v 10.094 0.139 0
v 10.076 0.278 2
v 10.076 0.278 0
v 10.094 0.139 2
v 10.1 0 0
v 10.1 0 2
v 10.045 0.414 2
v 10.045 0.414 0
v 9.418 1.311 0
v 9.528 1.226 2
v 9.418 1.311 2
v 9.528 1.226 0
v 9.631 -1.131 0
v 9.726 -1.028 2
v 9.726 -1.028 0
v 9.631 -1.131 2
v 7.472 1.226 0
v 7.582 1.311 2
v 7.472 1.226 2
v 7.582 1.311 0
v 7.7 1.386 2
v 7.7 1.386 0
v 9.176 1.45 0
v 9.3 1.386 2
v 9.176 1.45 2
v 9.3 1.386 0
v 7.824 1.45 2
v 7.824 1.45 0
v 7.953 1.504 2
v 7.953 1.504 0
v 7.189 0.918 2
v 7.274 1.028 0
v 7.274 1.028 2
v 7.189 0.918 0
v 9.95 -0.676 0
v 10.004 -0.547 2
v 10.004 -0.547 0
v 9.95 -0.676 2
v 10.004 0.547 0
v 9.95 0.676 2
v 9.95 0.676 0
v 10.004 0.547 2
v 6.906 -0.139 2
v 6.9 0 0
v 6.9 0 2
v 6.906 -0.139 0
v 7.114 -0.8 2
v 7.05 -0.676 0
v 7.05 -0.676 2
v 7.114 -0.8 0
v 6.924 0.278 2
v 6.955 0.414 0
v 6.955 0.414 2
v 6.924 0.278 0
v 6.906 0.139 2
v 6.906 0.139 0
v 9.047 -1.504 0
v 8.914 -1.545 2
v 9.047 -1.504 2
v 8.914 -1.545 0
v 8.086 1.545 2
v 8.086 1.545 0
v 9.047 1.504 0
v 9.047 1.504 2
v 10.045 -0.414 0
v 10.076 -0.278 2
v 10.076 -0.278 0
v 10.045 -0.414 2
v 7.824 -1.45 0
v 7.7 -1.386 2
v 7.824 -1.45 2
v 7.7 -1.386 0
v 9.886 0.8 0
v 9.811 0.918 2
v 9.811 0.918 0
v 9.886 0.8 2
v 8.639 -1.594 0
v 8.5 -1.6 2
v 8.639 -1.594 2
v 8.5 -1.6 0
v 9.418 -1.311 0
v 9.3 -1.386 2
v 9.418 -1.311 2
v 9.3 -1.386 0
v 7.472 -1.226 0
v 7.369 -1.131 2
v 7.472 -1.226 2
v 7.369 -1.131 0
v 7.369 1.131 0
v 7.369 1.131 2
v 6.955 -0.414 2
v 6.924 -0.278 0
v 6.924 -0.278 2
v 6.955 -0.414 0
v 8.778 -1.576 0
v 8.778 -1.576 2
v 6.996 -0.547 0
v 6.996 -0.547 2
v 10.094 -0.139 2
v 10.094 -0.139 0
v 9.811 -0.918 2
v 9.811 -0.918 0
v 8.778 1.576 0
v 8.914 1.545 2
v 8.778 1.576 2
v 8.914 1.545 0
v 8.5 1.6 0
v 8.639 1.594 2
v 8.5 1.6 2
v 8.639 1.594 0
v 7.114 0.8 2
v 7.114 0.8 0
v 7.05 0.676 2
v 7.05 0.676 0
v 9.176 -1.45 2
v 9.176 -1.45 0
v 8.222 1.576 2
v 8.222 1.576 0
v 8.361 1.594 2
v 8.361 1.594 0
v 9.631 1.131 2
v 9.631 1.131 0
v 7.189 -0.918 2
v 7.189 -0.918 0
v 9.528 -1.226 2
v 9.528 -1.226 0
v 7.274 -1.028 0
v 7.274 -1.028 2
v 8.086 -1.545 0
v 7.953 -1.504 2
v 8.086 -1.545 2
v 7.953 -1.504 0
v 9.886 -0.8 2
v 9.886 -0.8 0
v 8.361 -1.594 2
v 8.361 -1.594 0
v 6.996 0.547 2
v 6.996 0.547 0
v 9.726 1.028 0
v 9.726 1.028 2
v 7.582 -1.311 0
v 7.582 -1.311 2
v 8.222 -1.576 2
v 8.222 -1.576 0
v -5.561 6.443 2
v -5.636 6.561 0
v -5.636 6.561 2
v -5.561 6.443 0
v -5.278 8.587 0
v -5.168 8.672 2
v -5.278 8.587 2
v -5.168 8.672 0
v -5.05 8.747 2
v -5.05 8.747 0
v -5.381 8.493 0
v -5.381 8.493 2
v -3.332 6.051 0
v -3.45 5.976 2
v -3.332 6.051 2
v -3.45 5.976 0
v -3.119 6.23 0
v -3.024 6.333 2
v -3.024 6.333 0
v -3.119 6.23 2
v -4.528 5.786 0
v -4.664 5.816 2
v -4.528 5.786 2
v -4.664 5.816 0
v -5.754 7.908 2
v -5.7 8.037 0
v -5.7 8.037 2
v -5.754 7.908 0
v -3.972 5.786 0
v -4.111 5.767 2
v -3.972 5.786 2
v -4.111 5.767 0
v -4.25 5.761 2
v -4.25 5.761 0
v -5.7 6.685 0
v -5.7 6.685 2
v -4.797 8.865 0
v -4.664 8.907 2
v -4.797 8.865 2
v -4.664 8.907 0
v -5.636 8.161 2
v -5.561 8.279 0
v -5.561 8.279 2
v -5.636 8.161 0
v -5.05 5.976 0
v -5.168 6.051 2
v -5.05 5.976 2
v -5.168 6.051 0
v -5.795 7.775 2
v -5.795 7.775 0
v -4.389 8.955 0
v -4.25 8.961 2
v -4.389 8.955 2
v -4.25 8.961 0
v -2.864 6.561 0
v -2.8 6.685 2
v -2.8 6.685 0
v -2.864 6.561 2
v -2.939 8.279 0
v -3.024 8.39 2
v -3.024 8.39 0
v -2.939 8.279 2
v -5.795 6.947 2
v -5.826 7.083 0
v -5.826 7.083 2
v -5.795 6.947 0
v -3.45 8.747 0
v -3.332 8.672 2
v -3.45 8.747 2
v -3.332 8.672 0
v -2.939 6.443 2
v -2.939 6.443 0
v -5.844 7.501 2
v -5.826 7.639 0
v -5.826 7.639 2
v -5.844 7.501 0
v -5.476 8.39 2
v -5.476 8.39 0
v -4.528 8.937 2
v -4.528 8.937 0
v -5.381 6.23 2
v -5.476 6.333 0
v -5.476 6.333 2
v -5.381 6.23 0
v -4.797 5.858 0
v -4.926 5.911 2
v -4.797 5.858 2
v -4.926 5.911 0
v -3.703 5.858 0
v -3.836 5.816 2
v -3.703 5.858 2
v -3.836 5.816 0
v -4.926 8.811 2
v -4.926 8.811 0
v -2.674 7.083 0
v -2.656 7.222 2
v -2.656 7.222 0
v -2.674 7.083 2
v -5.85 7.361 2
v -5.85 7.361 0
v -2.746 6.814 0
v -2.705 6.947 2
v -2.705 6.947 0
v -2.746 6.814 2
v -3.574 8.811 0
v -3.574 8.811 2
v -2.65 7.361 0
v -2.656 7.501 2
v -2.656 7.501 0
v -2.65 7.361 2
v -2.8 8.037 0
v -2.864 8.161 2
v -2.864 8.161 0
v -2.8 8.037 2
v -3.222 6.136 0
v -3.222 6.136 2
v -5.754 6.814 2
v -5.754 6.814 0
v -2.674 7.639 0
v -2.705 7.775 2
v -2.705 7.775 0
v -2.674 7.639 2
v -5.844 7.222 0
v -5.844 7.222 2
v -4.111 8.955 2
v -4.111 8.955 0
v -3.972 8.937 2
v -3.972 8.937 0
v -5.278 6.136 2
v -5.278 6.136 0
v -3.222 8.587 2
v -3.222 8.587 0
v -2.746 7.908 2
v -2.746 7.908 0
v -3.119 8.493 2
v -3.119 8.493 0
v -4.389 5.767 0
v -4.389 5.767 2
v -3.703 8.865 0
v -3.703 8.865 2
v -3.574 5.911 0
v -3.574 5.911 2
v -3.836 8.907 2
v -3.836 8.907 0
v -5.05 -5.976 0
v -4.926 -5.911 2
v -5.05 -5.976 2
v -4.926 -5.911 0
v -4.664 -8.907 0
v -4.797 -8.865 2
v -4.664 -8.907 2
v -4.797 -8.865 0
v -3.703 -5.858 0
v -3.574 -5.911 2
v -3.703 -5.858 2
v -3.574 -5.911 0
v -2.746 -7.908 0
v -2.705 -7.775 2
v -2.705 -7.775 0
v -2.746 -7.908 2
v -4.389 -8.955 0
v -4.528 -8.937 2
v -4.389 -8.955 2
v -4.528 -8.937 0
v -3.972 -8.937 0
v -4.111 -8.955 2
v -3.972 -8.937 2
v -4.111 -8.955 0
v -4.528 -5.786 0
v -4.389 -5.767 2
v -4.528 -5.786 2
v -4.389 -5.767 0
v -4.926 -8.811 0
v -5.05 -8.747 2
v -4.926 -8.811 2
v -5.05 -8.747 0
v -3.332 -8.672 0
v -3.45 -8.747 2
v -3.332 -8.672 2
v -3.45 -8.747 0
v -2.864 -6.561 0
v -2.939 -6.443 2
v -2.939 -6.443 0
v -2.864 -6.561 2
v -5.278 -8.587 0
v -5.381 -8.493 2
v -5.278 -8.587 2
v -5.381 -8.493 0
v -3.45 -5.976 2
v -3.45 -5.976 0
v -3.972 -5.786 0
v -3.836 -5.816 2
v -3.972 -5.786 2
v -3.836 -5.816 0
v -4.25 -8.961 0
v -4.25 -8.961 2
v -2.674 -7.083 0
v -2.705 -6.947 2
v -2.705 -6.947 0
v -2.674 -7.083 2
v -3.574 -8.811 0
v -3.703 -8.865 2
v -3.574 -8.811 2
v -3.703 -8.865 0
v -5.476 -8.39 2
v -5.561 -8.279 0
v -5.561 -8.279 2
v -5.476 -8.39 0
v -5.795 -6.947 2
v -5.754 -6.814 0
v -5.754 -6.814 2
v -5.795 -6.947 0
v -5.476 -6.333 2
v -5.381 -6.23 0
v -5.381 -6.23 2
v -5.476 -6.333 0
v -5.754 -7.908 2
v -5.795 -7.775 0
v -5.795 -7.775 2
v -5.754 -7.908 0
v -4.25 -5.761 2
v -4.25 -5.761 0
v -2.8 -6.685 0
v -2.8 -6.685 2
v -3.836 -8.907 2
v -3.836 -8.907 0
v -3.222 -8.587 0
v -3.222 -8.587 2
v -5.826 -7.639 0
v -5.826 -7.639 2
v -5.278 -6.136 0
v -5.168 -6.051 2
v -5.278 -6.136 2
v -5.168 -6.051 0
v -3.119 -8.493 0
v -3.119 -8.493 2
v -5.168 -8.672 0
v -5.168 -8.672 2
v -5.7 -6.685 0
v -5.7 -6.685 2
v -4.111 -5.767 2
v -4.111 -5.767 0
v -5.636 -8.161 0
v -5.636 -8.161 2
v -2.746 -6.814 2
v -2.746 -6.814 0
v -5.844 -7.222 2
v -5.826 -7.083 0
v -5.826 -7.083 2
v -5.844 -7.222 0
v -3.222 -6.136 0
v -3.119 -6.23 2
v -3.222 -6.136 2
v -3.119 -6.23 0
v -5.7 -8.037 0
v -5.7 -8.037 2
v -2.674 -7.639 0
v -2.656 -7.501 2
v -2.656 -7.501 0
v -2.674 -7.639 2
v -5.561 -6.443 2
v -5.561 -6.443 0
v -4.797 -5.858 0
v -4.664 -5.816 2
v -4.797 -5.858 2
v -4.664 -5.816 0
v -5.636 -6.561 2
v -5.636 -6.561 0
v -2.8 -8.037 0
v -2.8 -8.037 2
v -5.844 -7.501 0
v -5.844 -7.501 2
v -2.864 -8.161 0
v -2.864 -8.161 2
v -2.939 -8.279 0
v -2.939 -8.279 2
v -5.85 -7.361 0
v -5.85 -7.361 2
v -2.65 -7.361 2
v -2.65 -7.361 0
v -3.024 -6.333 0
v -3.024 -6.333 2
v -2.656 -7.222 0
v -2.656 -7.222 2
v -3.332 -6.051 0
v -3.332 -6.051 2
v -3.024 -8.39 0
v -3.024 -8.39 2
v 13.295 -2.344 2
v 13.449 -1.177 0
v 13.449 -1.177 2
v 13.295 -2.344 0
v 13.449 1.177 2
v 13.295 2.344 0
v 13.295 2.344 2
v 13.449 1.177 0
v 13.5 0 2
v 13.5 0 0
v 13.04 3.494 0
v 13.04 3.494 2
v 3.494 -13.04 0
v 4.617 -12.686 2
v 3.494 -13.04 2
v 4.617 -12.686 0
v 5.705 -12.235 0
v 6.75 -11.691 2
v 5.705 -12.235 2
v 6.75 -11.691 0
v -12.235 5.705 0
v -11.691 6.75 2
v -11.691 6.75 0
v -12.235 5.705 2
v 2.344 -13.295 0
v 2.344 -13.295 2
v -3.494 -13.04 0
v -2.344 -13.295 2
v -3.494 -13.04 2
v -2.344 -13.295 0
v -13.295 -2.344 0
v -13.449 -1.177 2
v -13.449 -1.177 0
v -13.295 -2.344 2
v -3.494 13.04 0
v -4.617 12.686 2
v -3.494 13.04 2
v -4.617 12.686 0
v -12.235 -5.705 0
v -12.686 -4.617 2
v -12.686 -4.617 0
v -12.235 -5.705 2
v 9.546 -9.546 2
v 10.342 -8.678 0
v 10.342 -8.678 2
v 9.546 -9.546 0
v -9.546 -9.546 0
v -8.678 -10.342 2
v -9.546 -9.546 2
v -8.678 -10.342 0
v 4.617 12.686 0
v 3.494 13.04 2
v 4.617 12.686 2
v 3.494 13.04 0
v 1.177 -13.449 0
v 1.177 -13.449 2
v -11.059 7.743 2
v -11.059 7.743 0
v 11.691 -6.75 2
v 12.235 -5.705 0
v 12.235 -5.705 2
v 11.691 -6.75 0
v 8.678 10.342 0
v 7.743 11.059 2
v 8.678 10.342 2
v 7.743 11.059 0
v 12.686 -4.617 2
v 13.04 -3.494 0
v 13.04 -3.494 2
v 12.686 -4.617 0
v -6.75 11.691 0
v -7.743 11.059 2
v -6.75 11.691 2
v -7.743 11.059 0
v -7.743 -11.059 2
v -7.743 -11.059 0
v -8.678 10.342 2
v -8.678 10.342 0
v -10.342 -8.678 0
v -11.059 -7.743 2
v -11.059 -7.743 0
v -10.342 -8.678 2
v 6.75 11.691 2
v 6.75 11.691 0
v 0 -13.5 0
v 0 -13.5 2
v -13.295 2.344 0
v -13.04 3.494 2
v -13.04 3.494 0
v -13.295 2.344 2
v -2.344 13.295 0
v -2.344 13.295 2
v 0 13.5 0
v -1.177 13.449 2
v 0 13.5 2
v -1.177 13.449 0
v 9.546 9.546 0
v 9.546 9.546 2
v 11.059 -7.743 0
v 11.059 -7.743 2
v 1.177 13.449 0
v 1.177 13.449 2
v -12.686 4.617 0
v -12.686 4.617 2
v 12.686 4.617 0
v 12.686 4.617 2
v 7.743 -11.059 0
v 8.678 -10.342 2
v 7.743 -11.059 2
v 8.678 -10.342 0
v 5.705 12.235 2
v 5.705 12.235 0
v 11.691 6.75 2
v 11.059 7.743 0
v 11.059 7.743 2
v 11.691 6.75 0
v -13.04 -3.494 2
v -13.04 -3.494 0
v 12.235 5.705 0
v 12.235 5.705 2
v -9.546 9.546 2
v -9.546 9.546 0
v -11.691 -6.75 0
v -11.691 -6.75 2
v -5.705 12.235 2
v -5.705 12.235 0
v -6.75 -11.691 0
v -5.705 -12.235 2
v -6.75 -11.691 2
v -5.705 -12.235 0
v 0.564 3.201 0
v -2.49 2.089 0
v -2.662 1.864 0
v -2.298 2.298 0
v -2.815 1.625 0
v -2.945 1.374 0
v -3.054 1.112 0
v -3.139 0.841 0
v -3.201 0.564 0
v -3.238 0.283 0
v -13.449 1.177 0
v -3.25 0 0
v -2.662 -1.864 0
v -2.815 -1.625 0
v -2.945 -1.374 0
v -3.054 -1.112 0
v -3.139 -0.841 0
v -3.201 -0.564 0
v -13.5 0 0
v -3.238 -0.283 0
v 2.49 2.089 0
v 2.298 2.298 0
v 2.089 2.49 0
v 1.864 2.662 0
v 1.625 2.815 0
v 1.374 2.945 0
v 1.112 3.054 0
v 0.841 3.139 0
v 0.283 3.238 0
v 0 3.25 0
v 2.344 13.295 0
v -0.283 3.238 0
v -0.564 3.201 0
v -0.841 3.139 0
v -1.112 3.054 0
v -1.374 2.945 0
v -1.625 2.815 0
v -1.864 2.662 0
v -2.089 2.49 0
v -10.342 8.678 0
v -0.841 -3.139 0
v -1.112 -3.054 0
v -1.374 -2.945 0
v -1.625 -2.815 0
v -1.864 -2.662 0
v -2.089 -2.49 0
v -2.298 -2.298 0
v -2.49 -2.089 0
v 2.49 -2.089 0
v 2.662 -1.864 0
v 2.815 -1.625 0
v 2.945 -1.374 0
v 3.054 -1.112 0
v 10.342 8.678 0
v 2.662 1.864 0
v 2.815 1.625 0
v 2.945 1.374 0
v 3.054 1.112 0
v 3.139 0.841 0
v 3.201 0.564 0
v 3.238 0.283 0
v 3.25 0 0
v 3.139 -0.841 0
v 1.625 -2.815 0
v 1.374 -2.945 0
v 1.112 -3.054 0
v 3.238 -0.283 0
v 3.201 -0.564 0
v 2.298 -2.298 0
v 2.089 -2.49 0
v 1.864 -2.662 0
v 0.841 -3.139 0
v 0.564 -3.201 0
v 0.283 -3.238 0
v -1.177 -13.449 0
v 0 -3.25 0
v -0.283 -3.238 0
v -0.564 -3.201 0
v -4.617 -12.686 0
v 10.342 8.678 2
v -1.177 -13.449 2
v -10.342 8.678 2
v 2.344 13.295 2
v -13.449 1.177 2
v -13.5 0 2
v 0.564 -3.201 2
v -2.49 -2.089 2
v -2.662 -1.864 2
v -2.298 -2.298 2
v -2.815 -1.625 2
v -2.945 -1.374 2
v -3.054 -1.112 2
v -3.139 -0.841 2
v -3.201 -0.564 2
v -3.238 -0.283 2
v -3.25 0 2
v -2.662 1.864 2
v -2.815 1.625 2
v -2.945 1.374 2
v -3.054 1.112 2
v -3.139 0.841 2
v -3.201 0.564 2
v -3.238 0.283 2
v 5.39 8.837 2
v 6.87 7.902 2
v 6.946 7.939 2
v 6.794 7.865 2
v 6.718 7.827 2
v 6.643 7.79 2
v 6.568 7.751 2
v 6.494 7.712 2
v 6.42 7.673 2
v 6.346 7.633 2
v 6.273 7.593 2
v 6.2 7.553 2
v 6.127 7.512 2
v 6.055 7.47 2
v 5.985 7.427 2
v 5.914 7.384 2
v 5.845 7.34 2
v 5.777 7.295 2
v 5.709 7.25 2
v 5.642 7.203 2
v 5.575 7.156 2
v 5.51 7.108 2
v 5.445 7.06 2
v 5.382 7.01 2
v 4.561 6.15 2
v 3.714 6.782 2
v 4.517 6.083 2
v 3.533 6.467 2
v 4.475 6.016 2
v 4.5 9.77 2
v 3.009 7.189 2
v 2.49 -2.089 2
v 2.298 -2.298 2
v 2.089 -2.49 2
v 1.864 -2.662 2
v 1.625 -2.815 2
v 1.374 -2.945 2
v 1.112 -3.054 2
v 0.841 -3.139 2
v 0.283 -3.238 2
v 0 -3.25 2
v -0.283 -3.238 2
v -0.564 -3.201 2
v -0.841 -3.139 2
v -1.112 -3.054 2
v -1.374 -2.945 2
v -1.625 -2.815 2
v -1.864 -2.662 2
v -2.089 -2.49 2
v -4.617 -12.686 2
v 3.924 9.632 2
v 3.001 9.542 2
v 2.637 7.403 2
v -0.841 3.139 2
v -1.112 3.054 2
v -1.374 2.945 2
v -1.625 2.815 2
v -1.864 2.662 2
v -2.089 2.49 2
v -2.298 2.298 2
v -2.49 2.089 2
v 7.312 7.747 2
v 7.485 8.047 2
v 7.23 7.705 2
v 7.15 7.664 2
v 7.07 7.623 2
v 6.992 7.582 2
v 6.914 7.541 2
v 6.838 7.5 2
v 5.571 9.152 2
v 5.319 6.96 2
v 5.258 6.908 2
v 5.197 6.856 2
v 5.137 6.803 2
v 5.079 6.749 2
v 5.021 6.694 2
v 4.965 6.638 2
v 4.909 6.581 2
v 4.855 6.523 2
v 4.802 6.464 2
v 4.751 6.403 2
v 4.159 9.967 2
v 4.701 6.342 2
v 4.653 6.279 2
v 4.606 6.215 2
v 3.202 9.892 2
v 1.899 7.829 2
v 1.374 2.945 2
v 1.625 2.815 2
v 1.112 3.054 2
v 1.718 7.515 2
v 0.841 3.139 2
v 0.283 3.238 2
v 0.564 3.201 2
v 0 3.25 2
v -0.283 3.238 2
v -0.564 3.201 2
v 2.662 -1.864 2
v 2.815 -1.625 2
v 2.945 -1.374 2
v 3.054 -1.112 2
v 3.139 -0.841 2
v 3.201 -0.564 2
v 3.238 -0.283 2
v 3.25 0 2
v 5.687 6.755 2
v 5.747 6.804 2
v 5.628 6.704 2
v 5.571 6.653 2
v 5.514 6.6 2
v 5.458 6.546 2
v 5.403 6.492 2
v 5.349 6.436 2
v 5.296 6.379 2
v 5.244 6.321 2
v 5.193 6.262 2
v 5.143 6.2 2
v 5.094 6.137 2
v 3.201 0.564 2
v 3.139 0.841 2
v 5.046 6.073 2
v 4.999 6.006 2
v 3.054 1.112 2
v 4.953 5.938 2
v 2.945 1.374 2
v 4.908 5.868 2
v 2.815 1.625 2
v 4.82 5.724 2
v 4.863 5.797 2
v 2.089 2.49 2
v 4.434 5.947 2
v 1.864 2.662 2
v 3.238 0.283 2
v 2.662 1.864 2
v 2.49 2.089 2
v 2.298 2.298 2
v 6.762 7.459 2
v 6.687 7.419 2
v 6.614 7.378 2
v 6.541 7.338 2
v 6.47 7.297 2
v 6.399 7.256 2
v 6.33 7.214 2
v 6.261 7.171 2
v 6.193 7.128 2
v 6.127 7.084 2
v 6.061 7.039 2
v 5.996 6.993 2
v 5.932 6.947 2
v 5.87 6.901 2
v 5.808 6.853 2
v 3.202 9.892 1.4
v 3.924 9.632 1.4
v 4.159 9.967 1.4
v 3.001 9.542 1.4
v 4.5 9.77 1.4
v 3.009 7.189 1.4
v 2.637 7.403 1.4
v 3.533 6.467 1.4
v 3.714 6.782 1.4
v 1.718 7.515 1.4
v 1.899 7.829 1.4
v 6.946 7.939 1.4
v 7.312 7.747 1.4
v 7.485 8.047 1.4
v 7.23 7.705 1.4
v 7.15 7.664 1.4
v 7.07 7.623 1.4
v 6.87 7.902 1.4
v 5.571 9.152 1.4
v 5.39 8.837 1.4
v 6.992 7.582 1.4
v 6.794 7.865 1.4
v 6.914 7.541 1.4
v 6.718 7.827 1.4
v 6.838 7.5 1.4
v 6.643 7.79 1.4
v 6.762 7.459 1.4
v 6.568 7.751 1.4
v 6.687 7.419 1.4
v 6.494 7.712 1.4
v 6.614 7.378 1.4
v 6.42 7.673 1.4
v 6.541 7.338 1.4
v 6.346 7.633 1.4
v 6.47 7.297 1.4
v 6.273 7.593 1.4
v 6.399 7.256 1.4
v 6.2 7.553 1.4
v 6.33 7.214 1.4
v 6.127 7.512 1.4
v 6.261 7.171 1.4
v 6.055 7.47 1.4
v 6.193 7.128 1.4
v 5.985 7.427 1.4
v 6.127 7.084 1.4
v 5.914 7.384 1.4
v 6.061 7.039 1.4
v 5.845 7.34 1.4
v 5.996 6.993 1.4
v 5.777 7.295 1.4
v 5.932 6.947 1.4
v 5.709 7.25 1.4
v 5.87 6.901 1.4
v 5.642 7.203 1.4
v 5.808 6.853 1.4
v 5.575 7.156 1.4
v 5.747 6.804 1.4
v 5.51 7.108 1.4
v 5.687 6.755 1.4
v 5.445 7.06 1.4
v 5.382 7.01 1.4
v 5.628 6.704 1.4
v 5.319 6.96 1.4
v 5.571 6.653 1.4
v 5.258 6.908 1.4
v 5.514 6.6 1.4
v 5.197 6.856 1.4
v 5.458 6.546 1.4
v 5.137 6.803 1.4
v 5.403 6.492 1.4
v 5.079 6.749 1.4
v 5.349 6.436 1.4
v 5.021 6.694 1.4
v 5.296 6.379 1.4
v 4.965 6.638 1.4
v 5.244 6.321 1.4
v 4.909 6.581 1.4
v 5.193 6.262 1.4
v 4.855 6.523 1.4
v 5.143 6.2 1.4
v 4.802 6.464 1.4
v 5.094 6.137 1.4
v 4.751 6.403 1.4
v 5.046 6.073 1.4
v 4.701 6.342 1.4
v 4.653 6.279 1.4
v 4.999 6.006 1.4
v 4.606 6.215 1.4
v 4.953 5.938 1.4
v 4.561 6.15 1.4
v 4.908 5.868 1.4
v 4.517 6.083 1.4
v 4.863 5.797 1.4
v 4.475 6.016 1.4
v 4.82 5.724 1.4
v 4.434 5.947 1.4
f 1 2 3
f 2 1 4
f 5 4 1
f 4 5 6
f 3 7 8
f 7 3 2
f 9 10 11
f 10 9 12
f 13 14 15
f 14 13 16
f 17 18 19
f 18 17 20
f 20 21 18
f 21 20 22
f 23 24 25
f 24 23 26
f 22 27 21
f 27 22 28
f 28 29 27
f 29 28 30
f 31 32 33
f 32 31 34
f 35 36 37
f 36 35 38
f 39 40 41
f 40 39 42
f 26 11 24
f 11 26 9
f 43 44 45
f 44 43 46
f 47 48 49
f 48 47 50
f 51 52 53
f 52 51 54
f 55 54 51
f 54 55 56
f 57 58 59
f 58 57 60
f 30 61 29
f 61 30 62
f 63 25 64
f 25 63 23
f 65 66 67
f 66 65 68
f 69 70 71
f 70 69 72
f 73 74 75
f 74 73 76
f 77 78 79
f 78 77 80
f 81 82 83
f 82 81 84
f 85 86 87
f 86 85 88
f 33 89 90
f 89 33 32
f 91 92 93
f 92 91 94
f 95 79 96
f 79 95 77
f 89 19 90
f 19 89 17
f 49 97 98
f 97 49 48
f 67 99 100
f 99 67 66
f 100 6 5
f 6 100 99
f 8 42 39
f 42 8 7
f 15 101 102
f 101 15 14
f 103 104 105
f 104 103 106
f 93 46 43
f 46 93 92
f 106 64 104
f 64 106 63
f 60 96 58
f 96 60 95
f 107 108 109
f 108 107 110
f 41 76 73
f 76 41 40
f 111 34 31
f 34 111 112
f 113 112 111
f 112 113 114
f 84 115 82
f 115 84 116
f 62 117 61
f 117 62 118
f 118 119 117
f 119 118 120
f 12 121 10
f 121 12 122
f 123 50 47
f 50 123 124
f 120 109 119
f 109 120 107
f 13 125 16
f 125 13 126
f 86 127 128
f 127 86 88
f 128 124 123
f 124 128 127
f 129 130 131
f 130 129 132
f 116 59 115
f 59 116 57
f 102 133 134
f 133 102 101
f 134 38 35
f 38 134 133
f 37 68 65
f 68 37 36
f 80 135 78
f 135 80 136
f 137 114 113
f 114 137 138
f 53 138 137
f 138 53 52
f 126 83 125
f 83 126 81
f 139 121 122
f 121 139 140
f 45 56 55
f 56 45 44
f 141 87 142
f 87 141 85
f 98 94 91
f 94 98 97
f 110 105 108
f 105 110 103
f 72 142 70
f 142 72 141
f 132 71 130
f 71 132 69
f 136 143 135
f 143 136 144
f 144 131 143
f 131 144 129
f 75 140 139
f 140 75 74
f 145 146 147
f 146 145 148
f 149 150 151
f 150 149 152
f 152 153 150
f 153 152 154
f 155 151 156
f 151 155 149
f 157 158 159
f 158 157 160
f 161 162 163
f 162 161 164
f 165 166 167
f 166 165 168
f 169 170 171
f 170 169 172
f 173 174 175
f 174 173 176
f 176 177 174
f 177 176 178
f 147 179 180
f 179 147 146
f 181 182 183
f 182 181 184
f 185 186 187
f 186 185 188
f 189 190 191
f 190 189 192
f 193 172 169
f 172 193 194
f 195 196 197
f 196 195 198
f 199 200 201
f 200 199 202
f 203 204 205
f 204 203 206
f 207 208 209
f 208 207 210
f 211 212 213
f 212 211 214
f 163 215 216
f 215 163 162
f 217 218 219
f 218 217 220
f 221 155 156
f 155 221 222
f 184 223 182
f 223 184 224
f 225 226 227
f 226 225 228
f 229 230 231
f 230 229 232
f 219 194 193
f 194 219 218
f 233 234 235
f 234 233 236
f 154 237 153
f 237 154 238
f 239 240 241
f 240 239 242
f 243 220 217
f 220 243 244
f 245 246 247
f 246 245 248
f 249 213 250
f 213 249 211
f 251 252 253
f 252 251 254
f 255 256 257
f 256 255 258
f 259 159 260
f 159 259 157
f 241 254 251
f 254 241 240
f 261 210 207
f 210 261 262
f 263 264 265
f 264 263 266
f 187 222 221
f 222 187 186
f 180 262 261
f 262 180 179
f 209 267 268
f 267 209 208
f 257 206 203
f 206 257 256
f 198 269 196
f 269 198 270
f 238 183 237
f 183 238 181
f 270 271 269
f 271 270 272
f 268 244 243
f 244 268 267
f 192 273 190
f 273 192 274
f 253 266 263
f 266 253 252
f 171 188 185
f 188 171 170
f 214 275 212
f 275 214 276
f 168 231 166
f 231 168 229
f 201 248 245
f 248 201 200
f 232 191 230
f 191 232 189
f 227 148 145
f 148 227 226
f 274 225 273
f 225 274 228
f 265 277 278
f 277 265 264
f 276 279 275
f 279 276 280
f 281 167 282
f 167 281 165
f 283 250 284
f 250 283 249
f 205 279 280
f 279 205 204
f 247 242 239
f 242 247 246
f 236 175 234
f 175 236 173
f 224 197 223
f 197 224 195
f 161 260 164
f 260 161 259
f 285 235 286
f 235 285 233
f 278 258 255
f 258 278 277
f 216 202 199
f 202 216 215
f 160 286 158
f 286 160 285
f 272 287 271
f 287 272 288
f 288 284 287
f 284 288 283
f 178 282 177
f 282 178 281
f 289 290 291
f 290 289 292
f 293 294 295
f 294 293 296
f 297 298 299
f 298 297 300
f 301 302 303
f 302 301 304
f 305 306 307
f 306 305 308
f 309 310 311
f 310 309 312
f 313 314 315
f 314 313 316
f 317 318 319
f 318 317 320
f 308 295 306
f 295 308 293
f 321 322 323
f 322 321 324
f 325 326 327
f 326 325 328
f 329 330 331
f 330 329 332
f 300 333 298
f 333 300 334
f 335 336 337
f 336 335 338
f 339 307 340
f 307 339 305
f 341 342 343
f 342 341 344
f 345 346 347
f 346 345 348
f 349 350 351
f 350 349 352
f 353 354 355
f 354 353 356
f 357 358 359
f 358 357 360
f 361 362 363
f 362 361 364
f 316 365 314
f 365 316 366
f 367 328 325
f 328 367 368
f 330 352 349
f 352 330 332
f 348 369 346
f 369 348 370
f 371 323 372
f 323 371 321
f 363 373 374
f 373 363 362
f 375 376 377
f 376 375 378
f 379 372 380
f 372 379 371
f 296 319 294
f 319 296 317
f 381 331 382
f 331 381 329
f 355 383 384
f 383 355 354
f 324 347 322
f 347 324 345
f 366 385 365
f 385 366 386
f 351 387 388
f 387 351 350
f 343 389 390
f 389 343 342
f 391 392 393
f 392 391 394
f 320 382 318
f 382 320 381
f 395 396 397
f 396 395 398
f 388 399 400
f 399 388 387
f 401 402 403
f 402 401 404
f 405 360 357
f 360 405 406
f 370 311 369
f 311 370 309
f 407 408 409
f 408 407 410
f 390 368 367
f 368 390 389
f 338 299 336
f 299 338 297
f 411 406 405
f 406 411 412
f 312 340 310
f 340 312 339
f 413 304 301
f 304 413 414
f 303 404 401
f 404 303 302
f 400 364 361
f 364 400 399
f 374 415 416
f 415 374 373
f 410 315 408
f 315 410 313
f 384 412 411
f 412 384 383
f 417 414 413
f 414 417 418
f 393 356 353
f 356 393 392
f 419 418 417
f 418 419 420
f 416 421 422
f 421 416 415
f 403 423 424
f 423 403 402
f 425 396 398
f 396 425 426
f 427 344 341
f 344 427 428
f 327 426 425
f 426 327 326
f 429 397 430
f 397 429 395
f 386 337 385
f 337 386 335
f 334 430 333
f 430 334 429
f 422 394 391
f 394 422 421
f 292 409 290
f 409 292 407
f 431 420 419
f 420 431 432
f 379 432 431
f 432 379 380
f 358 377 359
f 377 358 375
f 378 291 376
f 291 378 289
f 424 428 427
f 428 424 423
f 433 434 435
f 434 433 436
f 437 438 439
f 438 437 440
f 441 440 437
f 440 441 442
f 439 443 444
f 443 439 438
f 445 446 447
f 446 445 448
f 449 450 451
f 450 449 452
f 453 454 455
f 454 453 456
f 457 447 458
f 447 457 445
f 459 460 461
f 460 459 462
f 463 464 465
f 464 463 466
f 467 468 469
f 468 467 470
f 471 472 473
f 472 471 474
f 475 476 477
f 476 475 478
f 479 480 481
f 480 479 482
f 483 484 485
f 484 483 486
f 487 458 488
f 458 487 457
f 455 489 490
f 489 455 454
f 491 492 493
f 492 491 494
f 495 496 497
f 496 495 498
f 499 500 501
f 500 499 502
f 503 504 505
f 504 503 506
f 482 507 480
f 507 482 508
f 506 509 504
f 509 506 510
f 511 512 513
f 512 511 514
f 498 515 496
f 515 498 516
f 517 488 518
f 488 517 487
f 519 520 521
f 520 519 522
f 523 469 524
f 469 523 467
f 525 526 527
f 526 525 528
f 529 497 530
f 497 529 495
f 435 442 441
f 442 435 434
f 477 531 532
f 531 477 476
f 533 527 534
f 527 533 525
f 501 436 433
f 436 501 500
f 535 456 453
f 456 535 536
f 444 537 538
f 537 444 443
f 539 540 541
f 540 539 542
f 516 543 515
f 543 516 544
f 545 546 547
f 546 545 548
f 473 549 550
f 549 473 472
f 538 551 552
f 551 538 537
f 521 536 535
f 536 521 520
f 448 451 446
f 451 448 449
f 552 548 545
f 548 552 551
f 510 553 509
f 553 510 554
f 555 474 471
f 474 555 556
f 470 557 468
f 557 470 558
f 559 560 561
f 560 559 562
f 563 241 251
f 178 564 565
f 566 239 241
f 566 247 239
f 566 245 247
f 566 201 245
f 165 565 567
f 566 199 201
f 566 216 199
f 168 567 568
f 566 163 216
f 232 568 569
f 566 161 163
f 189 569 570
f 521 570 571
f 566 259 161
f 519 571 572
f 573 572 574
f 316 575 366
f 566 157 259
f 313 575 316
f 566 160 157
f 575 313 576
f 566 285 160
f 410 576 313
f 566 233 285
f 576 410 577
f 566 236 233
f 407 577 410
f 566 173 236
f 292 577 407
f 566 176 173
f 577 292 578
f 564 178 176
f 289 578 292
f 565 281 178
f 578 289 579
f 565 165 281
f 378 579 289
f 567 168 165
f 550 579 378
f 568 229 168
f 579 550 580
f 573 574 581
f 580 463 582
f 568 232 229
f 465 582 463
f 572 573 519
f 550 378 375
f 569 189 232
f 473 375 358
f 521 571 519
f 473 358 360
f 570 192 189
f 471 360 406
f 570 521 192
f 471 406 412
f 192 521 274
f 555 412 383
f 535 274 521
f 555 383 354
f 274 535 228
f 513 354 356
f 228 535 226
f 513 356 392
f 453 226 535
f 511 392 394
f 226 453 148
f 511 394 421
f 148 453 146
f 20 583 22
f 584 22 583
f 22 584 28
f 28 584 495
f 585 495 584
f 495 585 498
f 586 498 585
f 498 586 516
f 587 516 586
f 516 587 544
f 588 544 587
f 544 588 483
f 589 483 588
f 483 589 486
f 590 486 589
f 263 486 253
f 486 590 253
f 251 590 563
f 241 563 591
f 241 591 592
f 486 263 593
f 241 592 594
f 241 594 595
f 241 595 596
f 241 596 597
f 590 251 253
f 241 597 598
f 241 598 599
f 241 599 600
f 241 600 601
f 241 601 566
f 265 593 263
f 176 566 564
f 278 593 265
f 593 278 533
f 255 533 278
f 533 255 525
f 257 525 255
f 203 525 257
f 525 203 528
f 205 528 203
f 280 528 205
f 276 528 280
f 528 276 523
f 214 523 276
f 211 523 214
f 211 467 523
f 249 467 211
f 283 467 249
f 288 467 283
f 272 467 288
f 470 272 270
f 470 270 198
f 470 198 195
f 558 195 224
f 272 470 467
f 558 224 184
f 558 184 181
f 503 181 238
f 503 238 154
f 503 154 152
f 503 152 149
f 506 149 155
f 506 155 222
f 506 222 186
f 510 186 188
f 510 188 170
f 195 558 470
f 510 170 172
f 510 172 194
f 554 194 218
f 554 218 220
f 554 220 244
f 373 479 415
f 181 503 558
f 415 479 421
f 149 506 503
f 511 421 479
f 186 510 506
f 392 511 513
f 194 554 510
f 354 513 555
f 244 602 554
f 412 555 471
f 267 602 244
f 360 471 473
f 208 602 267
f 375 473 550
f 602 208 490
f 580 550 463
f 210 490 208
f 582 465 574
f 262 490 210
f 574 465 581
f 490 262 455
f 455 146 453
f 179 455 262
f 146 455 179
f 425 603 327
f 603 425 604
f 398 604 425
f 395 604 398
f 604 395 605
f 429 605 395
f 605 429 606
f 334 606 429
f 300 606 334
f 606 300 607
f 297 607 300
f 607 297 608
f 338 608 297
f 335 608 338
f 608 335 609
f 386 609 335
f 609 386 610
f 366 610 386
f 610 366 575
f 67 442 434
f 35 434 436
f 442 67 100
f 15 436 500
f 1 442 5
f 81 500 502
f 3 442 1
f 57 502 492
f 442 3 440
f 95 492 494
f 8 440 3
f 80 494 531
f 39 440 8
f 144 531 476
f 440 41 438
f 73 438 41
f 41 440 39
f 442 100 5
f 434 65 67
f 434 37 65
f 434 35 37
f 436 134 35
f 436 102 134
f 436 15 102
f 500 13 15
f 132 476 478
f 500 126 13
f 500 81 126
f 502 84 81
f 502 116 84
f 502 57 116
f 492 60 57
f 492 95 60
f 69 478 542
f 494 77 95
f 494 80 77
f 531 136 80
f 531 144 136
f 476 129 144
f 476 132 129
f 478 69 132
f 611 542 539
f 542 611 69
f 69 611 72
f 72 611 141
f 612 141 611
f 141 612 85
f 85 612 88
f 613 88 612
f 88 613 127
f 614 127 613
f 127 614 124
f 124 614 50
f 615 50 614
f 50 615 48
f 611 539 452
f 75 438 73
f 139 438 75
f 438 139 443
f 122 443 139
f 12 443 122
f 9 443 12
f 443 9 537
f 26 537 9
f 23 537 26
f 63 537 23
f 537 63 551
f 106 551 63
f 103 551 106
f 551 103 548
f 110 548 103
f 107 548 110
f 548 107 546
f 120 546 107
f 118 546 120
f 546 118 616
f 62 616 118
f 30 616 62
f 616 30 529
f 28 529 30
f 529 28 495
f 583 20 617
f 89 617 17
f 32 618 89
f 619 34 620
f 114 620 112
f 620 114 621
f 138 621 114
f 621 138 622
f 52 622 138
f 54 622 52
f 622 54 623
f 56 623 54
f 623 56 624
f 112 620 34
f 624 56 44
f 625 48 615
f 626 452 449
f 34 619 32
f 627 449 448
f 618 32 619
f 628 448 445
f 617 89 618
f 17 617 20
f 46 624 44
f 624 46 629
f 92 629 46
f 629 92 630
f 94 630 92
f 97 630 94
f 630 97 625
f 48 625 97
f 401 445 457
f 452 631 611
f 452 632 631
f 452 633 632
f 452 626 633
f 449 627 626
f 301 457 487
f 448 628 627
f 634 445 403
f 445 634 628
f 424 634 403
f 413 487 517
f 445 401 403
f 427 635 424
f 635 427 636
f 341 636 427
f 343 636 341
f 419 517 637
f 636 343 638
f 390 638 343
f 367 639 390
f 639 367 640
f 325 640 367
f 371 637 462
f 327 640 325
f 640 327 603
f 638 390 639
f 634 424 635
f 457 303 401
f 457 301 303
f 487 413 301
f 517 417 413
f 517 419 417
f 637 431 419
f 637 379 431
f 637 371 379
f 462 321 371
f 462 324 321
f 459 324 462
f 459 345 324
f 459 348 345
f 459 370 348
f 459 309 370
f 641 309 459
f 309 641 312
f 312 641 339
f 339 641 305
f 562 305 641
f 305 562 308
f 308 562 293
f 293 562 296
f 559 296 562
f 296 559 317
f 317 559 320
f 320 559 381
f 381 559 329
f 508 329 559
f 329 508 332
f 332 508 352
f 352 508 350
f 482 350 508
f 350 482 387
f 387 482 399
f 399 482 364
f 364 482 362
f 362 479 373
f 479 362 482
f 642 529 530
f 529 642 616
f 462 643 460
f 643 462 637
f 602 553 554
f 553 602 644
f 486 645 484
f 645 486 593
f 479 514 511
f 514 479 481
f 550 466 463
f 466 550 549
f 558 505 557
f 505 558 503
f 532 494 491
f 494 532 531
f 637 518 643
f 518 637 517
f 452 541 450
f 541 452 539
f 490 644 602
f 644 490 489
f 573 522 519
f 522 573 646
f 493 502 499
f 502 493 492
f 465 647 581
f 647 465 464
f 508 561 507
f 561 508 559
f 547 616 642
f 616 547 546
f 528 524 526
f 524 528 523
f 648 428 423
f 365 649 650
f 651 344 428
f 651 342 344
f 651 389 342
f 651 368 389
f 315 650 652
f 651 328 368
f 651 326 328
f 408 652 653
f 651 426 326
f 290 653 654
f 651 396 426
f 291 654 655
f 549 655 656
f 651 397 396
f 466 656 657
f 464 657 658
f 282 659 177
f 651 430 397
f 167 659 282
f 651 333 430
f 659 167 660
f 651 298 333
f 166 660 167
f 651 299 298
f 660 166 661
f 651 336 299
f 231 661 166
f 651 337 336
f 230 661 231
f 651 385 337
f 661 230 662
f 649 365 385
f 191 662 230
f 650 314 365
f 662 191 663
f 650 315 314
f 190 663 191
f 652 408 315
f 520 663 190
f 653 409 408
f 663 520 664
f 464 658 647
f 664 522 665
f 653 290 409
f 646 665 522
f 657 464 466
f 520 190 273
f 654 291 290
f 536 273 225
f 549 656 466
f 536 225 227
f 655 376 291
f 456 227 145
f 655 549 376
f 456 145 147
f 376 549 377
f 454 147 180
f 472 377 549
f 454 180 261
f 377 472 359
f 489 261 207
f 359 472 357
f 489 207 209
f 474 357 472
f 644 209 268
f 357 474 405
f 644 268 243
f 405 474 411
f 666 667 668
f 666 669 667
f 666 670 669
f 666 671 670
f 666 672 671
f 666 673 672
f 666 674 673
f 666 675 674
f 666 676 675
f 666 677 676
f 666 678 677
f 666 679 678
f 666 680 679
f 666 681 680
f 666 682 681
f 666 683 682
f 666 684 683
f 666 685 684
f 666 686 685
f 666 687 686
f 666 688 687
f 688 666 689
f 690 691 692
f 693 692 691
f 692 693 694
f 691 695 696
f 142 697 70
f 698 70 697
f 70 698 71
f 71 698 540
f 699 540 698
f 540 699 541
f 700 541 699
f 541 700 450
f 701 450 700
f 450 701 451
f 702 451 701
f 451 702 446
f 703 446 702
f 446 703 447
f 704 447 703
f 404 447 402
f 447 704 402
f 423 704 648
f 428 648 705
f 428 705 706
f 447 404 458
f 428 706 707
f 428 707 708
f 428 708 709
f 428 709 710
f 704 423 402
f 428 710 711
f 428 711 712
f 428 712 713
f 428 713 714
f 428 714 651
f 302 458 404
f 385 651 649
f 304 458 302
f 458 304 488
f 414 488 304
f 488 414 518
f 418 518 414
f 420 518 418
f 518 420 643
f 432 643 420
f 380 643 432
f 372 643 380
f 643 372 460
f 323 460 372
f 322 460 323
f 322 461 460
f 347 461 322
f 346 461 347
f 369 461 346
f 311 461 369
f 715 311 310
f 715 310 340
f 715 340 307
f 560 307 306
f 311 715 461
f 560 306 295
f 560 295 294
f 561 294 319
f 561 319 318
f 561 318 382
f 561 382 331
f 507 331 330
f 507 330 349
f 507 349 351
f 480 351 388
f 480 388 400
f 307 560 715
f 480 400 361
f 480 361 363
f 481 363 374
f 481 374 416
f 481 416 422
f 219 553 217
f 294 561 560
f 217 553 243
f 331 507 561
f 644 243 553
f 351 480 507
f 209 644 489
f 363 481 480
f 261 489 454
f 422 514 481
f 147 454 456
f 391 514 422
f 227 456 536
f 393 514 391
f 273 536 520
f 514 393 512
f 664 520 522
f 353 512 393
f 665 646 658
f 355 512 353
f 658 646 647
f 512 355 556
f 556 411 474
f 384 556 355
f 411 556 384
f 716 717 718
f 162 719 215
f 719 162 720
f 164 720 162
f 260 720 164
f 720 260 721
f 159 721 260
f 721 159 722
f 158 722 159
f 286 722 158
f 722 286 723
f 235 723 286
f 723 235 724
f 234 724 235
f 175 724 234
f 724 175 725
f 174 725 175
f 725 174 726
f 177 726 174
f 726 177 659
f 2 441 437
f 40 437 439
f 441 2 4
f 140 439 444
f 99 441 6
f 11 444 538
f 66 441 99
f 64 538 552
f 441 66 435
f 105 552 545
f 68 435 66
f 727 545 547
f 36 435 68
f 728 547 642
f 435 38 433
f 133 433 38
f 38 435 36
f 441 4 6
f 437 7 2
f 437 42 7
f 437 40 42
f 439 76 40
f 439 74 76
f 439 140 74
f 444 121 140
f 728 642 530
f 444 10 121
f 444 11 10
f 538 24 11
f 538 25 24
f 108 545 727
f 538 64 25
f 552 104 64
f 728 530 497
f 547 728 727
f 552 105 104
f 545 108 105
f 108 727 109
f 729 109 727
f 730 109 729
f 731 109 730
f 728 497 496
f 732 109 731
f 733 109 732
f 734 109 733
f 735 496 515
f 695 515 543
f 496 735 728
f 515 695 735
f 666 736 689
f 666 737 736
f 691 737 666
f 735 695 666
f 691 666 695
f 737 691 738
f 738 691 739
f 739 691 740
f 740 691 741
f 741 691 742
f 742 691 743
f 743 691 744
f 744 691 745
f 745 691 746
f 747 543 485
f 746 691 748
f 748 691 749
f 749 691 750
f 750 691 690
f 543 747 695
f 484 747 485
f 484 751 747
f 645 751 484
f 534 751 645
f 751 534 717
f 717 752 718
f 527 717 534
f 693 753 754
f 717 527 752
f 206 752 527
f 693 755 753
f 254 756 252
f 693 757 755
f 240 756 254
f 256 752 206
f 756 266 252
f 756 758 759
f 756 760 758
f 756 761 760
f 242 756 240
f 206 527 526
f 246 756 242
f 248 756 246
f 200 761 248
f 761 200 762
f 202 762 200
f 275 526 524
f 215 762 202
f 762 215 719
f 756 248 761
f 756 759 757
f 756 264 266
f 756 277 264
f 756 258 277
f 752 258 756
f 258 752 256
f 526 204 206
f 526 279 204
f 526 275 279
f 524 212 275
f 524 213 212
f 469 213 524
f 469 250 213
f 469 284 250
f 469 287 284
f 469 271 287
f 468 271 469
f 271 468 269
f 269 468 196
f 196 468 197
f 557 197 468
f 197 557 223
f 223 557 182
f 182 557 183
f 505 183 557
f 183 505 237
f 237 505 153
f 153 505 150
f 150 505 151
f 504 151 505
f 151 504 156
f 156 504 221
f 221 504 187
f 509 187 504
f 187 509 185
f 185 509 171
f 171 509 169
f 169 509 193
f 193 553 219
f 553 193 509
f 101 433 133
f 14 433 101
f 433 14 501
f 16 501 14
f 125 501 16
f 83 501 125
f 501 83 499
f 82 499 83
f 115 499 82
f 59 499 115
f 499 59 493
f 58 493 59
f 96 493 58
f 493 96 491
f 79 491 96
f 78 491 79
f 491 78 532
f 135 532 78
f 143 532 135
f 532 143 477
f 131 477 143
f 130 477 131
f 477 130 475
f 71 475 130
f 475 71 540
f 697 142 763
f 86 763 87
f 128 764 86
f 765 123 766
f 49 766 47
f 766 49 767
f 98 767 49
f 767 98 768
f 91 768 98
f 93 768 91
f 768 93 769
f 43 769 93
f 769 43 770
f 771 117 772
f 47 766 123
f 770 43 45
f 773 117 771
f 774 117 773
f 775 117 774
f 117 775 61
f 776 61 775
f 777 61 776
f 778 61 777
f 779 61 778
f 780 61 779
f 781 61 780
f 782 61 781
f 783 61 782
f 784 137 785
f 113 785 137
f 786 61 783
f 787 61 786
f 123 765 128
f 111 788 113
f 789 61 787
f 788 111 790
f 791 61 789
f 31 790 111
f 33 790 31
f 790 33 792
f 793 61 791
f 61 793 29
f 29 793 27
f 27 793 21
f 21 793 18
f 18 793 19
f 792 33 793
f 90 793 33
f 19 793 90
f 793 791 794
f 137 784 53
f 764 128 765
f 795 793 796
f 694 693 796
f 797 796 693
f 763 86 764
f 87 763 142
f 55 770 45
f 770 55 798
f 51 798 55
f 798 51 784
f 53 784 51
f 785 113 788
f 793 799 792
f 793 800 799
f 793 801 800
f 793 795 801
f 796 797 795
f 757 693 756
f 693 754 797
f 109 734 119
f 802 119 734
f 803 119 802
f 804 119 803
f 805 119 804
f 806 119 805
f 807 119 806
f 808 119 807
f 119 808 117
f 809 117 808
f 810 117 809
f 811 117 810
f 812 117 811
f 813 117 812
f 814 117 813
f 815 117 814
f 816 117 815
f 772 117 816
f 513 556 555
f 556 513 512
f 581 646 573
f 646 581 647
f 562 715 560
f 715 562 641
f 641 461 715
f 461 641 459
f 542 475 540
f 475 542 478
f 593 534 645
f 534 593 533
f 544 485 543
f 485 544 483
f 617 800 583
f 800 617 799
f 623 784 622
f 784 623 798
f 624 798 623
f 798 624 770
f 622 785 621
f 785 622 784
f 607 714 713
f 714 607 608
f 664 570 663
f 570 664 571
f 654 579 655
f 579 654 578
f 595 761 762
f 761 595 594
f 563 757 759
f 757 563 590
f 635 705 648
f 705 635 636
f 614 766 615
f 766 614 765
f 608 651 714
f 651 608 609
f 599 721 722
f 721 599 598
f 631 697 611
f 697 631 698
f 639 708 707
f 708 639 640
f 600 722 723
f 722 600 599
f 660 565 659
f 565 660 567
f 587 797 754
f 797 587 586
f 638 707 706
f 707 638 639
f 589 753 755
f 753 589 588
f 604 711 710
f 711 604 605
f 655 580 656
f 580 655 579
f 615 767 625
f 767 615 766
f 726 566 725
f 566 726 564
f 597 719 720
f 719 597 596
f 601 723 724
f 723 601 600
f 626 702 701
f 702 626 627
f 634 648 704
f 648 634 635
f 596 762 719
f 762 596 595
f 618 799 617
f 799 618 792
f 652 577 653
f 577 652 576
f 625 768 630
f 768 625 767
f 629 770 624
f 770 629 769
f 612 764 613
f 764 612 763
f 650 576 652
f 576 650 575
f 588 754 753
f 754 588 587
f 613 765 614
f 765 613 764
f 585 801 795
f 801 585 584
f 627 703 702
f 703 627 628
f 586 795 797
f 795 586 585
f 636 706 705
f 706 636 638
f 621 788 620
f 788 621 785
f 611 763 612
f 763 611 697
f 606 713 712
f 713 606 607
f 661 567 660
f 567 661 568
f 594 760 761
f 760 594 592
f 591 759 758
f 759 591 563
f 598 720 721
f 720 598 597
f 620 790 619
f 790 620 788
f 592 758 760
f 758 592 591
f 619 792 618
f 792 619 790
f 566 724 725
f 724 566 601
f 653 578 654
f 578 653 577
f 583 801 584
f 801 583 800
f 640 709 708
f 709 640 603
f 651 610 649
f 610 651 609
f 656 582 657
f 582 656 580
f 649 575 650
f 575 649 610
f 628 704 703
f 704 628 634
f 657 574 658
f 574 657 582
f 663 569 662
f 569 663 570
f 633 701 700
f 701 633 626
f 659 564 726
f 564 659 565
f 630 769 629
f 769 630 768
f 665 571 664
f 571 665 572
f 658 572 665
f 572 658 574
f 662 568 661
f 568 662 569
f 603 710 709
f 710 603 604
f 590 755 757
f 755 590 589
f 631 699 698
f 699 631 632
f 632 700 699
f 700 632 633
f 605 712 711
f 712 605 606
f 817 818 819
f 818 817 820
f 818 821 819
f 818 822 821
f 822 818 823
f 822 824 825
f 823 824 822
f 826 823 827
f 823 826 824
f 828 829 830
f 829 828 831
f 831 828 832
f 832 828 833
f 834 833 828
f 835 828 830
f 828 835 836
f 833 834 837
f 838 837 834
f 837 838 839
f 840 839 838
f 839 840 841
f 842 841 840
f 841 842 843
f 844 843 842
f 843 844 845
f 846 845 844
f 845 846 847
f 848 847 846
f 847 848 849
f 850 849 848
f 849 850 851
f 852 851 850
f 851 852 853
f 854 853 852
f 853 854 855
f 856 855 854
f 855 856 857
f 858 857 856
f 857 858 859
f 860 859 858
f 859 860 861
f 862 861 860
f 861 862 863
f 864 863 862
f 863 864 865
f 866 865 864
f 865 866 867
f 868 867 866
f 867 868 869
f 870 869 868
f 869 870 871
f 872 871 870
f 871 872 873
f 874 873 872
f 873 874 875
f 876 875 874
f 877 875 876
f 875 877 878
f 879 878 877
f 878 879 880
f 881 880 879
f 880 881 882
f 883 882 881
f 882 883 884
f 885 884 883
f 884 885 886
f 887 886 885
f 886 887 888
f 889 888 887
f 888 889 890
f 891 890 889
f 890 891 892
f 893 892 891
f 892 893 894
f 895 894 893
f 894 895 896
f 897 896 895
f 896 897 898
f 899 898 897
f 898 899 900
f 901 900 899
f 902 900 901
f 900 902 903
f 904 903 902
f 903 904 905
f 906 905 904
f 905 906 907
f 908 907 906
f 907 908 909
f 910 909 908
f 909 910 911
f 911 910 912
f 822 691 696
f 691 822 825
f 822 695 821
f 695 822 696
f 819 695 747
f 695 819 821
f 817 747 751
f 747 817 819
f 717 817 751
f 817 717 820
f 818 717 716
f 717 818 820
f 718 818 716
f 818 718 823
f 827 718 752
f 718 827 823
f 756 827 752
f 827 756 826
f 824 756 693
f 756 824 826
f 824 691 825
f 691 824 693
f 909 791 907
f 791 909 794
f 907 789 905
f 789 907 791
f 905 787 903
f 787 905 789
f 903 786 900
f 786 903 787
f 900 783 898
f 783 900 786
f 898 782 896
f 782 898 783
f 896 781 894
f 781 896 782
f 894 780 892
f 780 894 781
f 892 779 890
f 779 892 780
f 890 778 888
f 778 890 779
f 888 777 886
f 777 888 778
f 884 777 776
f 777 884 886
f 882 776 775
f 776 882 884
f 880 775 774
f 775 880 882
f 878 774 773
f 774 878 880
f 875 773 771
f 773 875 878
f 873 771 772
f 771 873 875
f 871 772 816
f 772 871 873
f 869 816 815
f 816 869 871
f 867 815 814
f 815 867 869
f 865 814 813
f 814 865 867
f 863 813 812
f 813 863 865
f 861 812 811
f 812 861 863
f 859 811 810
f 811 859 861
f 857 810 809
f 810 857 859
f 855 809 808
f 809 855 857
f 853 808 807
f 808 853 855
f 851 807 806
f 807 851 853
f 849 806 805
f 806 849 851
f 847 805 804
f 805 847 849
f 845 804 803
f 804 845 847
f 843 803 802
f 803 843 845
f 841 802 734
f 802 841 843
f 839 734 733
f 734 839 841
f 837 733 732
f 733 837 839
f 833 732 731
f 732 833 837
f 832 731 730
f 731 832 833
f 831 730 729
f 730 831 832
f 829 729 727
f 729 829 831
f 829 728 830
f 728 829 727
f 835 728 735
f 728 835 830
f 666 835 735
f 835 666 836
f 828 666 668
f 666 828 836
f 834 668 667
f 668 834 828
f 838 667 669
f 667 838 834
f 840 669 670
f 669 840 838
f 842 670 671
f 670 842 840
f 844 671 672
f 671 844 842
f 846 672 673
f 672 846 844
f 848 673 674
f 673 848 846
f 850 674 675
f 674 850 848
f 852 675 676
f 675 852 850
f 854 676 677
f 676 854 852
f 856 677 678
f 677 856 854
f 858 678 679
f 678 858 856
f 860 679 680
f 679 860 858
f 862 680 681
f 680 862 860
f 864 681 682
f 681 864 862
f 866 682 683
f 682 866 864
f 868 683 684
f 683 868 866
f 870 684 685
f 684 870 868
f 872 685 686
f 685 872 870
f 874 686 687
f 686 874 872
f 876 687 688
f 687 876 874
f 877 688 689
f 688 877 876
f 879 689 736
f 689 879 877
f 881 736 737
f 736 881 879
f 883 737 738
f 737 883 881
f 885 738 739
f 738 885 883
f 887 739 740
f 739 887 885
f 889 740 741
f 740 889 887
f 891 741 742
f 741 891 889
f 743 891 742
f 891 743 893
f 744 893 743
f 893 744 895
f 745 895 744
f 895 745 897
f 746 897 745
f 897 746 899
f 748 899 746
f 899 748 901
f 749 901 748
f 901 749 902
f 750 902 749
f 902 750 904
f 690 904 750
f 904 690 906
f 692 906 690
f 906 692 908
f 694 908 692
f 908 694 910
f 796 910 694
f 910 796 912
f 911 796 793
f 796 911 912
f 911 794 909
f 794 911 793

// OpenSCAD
// file: params.scad
// All dimensions in mm, densities in g/mm^3. Source of truth: docs/hardware/specs/cad.md.
// Frame: origin at the axle centre on the rod mid-plane; Z up the upright rod;
// Y along the axle away from the table edge; X along the table edge.

bed = 220;
rho_pla = 1.25e-3;
rho_steel = 7.85e-3;

rod_len = 250;                 // axle axis to motor axis

// ---- wheel (native axis Z) ----
wheel_d = 280;
rim_radial = 8;
rim_axial = 8;
spokes = 8;                    // two per quadrant
spoke_w = 4;
spoke_t = 8;
hub_d = 60;
hub_t = 5;
hub_bc_d = 45;                 // quadrant flange screws
hub_bore_d = 10;
flange_ri = 13;                // quadrant flange sector inner radius (clears rotor screw heads)
pocket_n = 16;                 // tuning holes every 22.5 deg, first at 11.25 deg
bolt_fit = 8;                  // standard number of M6 tuning bolts
lap_len = 8;                   // rim half-lap length along the rim

// ---- motor mj5208 ----
motor_d = 63;
motor_len = 25;
rotor_bc_d = 17;               // Ø17 confirmed with rotor_gauge.scad 2026-10-28 (drawing: Ø16 or Ø17 by batch)
rotor_n = 3;
stator_bc_d = 25;              // 4x M3 on a Ø25 bolt circle (mjbots mj5208 drawing rev.3 2025-07-26); 2nd pattern 3x M2.5 on Ø32 unused
stator_n = 4;
flange_d = 70;
flange_plate_t = 6;

// ---- test disc (PNDLM-11, docs/hardware/specs/test-disc.md) ----
td_d = 150;                    // outer diameter
td_ring_w = 14;                // ring radial width
td_ring_h = 10;                // ring axial height
td_edge_r = 2;                 // ring cross-section corner radius
td_hub_d = 40;                 // hub disc diameter
td_web_h = 8;                  // hub and spoke height
td_spokes = 3;
td_spoke_w = 10;
td_fillet = 6;                 // concave fillets at spoke junctions
td_bore_d = 6.5;               // clears the Ø5 x 2 mm shaft stub; Ø10 left too little wall to the M3 holes
td_cbore_d = 6;                // M3 socket head (Ø5.5) counterbore
td_cbore_h = 4.5;              // leaves 3.5 mm under the head: M3x8 engages 4.5 mm of rotor thread

// ---- pivot ----
axle_d = 8;
axle_len = 120;
bearing_od = 22;
bearing_w = 7;
bearing_spacing = 40;
axle_overhang = 60;            // table edge to rod mid-plane
axle_height = 30;              // table top to axle centre
table_min = 18;
table_max = 40;

// ---- rod ----
beam_w = 20;                   // X
beam_h = 20;                   // Y
flange_t = 3;
web_t = 3;
tongue_len = 40;
beam_end = rod_len - 60;       // tongue ends here so the beam fits the bed diagonally
clamp_size = [30, 20, 30];     // X, Y, Z around the axle
battery = [35, 25, 75];        // X, Y, Z as mounted on the -Y face
hat = [49, 58];                // RPi/pi3hat hole pattern: X, Z
hat_hole = 2.8;

// ---- stand ----
jaw_w = 40;
clamp_wall = 8;
throat = 60;
arm_w = 40;

// ---- fits and hardware ----
clearance = 0.3;
M3 = 3.4;
M6 = 6.4;
M8 = 8.4;
nut_m3_af = 5.5;
nut_m3_h = 2.4;
nut_m8_af = 13;
nut_m8_h = 6.5;
$fn = 72;
// file: lib.scad
include <params.scad>

// Axis-aligned box from (x0,y0,z0) to (x1,y1,z1).
module plate(x0, x1, y0, y1, z0, z1) translate([x0, y0, z0]) cube([x1 - x0, y1 - y0, z1 - z0]);

// Ring sector between angles a0..a1 (deg), radii ri..ro, height h from z=0.
module arc(a0, a1, ro, ri, h) rotate([0, 0, a0]) rotate_extrude(angle = a1 - a0) translate([ri, 0]) square([ro - ri, h]);

// Children placed at n points on a circle of diameter d, first at angle start.
module at_circle(d, n, start = 0) for (i = [0 : n - 1]) rotate([0, 0, start + i * 360 / n]) translate([d / 2, 0, 0]) children();

// Through hole along Z spanning z in [-1, h+1].
module hole(d, h) translate([0, 0, -1]) cylinder(d = d, h = h + 2);

// Hex nut pocket, across-flats af, from z=0 up to h.
module hex_pocket(af, h) cylinder(d = af / cos(30) + clearance, h = h, $fn = 6);

// Cylinder along +Y starting at y0.
module ycyl(d, h, y0 = 0) translate([0, y0, 0]) rotate([-90, 0, 0]) cylinder(d = d, h = h);
// main file
// Fit gauge for the mj5208 rotor bolt pattern: a 2 mm ring with 3x M3 on
// bolt circle `bc` (drawing: Ø16 or Ø17 by batch). Print one per candidate;
// the one that takes all three screws without force is the pattern.
include <lib.scad>

bc = 17;            // bolt circle to test
gauge_h = 2;
gauge_hole = 3.2;   // tight M3 clearance: 0.1 mm slop so Ø16 and Ø17 cannot both fit
gauge_od = bc + 10;
label_depth = 0.6;

module rotor_gauge() {
    difference() {
        cylinder(d = gauge_od, h = gauge_h);
        hole(td_bore_d, gauge_h);
        at_circle(bc, rotor_n) hole(gauge_hole, gauge_h);
        // bolt circle engraved on the top face, between two holes
        rotate(60) translate([bc / 2 + 0.5, 0, gauge_h - label_depth]) rotate(-90)
            linear_extrude(label_depth + 1) text(str(bc), size = 3.5, halign = "center", valign = "center");
    }
}

rotor_gauge();
